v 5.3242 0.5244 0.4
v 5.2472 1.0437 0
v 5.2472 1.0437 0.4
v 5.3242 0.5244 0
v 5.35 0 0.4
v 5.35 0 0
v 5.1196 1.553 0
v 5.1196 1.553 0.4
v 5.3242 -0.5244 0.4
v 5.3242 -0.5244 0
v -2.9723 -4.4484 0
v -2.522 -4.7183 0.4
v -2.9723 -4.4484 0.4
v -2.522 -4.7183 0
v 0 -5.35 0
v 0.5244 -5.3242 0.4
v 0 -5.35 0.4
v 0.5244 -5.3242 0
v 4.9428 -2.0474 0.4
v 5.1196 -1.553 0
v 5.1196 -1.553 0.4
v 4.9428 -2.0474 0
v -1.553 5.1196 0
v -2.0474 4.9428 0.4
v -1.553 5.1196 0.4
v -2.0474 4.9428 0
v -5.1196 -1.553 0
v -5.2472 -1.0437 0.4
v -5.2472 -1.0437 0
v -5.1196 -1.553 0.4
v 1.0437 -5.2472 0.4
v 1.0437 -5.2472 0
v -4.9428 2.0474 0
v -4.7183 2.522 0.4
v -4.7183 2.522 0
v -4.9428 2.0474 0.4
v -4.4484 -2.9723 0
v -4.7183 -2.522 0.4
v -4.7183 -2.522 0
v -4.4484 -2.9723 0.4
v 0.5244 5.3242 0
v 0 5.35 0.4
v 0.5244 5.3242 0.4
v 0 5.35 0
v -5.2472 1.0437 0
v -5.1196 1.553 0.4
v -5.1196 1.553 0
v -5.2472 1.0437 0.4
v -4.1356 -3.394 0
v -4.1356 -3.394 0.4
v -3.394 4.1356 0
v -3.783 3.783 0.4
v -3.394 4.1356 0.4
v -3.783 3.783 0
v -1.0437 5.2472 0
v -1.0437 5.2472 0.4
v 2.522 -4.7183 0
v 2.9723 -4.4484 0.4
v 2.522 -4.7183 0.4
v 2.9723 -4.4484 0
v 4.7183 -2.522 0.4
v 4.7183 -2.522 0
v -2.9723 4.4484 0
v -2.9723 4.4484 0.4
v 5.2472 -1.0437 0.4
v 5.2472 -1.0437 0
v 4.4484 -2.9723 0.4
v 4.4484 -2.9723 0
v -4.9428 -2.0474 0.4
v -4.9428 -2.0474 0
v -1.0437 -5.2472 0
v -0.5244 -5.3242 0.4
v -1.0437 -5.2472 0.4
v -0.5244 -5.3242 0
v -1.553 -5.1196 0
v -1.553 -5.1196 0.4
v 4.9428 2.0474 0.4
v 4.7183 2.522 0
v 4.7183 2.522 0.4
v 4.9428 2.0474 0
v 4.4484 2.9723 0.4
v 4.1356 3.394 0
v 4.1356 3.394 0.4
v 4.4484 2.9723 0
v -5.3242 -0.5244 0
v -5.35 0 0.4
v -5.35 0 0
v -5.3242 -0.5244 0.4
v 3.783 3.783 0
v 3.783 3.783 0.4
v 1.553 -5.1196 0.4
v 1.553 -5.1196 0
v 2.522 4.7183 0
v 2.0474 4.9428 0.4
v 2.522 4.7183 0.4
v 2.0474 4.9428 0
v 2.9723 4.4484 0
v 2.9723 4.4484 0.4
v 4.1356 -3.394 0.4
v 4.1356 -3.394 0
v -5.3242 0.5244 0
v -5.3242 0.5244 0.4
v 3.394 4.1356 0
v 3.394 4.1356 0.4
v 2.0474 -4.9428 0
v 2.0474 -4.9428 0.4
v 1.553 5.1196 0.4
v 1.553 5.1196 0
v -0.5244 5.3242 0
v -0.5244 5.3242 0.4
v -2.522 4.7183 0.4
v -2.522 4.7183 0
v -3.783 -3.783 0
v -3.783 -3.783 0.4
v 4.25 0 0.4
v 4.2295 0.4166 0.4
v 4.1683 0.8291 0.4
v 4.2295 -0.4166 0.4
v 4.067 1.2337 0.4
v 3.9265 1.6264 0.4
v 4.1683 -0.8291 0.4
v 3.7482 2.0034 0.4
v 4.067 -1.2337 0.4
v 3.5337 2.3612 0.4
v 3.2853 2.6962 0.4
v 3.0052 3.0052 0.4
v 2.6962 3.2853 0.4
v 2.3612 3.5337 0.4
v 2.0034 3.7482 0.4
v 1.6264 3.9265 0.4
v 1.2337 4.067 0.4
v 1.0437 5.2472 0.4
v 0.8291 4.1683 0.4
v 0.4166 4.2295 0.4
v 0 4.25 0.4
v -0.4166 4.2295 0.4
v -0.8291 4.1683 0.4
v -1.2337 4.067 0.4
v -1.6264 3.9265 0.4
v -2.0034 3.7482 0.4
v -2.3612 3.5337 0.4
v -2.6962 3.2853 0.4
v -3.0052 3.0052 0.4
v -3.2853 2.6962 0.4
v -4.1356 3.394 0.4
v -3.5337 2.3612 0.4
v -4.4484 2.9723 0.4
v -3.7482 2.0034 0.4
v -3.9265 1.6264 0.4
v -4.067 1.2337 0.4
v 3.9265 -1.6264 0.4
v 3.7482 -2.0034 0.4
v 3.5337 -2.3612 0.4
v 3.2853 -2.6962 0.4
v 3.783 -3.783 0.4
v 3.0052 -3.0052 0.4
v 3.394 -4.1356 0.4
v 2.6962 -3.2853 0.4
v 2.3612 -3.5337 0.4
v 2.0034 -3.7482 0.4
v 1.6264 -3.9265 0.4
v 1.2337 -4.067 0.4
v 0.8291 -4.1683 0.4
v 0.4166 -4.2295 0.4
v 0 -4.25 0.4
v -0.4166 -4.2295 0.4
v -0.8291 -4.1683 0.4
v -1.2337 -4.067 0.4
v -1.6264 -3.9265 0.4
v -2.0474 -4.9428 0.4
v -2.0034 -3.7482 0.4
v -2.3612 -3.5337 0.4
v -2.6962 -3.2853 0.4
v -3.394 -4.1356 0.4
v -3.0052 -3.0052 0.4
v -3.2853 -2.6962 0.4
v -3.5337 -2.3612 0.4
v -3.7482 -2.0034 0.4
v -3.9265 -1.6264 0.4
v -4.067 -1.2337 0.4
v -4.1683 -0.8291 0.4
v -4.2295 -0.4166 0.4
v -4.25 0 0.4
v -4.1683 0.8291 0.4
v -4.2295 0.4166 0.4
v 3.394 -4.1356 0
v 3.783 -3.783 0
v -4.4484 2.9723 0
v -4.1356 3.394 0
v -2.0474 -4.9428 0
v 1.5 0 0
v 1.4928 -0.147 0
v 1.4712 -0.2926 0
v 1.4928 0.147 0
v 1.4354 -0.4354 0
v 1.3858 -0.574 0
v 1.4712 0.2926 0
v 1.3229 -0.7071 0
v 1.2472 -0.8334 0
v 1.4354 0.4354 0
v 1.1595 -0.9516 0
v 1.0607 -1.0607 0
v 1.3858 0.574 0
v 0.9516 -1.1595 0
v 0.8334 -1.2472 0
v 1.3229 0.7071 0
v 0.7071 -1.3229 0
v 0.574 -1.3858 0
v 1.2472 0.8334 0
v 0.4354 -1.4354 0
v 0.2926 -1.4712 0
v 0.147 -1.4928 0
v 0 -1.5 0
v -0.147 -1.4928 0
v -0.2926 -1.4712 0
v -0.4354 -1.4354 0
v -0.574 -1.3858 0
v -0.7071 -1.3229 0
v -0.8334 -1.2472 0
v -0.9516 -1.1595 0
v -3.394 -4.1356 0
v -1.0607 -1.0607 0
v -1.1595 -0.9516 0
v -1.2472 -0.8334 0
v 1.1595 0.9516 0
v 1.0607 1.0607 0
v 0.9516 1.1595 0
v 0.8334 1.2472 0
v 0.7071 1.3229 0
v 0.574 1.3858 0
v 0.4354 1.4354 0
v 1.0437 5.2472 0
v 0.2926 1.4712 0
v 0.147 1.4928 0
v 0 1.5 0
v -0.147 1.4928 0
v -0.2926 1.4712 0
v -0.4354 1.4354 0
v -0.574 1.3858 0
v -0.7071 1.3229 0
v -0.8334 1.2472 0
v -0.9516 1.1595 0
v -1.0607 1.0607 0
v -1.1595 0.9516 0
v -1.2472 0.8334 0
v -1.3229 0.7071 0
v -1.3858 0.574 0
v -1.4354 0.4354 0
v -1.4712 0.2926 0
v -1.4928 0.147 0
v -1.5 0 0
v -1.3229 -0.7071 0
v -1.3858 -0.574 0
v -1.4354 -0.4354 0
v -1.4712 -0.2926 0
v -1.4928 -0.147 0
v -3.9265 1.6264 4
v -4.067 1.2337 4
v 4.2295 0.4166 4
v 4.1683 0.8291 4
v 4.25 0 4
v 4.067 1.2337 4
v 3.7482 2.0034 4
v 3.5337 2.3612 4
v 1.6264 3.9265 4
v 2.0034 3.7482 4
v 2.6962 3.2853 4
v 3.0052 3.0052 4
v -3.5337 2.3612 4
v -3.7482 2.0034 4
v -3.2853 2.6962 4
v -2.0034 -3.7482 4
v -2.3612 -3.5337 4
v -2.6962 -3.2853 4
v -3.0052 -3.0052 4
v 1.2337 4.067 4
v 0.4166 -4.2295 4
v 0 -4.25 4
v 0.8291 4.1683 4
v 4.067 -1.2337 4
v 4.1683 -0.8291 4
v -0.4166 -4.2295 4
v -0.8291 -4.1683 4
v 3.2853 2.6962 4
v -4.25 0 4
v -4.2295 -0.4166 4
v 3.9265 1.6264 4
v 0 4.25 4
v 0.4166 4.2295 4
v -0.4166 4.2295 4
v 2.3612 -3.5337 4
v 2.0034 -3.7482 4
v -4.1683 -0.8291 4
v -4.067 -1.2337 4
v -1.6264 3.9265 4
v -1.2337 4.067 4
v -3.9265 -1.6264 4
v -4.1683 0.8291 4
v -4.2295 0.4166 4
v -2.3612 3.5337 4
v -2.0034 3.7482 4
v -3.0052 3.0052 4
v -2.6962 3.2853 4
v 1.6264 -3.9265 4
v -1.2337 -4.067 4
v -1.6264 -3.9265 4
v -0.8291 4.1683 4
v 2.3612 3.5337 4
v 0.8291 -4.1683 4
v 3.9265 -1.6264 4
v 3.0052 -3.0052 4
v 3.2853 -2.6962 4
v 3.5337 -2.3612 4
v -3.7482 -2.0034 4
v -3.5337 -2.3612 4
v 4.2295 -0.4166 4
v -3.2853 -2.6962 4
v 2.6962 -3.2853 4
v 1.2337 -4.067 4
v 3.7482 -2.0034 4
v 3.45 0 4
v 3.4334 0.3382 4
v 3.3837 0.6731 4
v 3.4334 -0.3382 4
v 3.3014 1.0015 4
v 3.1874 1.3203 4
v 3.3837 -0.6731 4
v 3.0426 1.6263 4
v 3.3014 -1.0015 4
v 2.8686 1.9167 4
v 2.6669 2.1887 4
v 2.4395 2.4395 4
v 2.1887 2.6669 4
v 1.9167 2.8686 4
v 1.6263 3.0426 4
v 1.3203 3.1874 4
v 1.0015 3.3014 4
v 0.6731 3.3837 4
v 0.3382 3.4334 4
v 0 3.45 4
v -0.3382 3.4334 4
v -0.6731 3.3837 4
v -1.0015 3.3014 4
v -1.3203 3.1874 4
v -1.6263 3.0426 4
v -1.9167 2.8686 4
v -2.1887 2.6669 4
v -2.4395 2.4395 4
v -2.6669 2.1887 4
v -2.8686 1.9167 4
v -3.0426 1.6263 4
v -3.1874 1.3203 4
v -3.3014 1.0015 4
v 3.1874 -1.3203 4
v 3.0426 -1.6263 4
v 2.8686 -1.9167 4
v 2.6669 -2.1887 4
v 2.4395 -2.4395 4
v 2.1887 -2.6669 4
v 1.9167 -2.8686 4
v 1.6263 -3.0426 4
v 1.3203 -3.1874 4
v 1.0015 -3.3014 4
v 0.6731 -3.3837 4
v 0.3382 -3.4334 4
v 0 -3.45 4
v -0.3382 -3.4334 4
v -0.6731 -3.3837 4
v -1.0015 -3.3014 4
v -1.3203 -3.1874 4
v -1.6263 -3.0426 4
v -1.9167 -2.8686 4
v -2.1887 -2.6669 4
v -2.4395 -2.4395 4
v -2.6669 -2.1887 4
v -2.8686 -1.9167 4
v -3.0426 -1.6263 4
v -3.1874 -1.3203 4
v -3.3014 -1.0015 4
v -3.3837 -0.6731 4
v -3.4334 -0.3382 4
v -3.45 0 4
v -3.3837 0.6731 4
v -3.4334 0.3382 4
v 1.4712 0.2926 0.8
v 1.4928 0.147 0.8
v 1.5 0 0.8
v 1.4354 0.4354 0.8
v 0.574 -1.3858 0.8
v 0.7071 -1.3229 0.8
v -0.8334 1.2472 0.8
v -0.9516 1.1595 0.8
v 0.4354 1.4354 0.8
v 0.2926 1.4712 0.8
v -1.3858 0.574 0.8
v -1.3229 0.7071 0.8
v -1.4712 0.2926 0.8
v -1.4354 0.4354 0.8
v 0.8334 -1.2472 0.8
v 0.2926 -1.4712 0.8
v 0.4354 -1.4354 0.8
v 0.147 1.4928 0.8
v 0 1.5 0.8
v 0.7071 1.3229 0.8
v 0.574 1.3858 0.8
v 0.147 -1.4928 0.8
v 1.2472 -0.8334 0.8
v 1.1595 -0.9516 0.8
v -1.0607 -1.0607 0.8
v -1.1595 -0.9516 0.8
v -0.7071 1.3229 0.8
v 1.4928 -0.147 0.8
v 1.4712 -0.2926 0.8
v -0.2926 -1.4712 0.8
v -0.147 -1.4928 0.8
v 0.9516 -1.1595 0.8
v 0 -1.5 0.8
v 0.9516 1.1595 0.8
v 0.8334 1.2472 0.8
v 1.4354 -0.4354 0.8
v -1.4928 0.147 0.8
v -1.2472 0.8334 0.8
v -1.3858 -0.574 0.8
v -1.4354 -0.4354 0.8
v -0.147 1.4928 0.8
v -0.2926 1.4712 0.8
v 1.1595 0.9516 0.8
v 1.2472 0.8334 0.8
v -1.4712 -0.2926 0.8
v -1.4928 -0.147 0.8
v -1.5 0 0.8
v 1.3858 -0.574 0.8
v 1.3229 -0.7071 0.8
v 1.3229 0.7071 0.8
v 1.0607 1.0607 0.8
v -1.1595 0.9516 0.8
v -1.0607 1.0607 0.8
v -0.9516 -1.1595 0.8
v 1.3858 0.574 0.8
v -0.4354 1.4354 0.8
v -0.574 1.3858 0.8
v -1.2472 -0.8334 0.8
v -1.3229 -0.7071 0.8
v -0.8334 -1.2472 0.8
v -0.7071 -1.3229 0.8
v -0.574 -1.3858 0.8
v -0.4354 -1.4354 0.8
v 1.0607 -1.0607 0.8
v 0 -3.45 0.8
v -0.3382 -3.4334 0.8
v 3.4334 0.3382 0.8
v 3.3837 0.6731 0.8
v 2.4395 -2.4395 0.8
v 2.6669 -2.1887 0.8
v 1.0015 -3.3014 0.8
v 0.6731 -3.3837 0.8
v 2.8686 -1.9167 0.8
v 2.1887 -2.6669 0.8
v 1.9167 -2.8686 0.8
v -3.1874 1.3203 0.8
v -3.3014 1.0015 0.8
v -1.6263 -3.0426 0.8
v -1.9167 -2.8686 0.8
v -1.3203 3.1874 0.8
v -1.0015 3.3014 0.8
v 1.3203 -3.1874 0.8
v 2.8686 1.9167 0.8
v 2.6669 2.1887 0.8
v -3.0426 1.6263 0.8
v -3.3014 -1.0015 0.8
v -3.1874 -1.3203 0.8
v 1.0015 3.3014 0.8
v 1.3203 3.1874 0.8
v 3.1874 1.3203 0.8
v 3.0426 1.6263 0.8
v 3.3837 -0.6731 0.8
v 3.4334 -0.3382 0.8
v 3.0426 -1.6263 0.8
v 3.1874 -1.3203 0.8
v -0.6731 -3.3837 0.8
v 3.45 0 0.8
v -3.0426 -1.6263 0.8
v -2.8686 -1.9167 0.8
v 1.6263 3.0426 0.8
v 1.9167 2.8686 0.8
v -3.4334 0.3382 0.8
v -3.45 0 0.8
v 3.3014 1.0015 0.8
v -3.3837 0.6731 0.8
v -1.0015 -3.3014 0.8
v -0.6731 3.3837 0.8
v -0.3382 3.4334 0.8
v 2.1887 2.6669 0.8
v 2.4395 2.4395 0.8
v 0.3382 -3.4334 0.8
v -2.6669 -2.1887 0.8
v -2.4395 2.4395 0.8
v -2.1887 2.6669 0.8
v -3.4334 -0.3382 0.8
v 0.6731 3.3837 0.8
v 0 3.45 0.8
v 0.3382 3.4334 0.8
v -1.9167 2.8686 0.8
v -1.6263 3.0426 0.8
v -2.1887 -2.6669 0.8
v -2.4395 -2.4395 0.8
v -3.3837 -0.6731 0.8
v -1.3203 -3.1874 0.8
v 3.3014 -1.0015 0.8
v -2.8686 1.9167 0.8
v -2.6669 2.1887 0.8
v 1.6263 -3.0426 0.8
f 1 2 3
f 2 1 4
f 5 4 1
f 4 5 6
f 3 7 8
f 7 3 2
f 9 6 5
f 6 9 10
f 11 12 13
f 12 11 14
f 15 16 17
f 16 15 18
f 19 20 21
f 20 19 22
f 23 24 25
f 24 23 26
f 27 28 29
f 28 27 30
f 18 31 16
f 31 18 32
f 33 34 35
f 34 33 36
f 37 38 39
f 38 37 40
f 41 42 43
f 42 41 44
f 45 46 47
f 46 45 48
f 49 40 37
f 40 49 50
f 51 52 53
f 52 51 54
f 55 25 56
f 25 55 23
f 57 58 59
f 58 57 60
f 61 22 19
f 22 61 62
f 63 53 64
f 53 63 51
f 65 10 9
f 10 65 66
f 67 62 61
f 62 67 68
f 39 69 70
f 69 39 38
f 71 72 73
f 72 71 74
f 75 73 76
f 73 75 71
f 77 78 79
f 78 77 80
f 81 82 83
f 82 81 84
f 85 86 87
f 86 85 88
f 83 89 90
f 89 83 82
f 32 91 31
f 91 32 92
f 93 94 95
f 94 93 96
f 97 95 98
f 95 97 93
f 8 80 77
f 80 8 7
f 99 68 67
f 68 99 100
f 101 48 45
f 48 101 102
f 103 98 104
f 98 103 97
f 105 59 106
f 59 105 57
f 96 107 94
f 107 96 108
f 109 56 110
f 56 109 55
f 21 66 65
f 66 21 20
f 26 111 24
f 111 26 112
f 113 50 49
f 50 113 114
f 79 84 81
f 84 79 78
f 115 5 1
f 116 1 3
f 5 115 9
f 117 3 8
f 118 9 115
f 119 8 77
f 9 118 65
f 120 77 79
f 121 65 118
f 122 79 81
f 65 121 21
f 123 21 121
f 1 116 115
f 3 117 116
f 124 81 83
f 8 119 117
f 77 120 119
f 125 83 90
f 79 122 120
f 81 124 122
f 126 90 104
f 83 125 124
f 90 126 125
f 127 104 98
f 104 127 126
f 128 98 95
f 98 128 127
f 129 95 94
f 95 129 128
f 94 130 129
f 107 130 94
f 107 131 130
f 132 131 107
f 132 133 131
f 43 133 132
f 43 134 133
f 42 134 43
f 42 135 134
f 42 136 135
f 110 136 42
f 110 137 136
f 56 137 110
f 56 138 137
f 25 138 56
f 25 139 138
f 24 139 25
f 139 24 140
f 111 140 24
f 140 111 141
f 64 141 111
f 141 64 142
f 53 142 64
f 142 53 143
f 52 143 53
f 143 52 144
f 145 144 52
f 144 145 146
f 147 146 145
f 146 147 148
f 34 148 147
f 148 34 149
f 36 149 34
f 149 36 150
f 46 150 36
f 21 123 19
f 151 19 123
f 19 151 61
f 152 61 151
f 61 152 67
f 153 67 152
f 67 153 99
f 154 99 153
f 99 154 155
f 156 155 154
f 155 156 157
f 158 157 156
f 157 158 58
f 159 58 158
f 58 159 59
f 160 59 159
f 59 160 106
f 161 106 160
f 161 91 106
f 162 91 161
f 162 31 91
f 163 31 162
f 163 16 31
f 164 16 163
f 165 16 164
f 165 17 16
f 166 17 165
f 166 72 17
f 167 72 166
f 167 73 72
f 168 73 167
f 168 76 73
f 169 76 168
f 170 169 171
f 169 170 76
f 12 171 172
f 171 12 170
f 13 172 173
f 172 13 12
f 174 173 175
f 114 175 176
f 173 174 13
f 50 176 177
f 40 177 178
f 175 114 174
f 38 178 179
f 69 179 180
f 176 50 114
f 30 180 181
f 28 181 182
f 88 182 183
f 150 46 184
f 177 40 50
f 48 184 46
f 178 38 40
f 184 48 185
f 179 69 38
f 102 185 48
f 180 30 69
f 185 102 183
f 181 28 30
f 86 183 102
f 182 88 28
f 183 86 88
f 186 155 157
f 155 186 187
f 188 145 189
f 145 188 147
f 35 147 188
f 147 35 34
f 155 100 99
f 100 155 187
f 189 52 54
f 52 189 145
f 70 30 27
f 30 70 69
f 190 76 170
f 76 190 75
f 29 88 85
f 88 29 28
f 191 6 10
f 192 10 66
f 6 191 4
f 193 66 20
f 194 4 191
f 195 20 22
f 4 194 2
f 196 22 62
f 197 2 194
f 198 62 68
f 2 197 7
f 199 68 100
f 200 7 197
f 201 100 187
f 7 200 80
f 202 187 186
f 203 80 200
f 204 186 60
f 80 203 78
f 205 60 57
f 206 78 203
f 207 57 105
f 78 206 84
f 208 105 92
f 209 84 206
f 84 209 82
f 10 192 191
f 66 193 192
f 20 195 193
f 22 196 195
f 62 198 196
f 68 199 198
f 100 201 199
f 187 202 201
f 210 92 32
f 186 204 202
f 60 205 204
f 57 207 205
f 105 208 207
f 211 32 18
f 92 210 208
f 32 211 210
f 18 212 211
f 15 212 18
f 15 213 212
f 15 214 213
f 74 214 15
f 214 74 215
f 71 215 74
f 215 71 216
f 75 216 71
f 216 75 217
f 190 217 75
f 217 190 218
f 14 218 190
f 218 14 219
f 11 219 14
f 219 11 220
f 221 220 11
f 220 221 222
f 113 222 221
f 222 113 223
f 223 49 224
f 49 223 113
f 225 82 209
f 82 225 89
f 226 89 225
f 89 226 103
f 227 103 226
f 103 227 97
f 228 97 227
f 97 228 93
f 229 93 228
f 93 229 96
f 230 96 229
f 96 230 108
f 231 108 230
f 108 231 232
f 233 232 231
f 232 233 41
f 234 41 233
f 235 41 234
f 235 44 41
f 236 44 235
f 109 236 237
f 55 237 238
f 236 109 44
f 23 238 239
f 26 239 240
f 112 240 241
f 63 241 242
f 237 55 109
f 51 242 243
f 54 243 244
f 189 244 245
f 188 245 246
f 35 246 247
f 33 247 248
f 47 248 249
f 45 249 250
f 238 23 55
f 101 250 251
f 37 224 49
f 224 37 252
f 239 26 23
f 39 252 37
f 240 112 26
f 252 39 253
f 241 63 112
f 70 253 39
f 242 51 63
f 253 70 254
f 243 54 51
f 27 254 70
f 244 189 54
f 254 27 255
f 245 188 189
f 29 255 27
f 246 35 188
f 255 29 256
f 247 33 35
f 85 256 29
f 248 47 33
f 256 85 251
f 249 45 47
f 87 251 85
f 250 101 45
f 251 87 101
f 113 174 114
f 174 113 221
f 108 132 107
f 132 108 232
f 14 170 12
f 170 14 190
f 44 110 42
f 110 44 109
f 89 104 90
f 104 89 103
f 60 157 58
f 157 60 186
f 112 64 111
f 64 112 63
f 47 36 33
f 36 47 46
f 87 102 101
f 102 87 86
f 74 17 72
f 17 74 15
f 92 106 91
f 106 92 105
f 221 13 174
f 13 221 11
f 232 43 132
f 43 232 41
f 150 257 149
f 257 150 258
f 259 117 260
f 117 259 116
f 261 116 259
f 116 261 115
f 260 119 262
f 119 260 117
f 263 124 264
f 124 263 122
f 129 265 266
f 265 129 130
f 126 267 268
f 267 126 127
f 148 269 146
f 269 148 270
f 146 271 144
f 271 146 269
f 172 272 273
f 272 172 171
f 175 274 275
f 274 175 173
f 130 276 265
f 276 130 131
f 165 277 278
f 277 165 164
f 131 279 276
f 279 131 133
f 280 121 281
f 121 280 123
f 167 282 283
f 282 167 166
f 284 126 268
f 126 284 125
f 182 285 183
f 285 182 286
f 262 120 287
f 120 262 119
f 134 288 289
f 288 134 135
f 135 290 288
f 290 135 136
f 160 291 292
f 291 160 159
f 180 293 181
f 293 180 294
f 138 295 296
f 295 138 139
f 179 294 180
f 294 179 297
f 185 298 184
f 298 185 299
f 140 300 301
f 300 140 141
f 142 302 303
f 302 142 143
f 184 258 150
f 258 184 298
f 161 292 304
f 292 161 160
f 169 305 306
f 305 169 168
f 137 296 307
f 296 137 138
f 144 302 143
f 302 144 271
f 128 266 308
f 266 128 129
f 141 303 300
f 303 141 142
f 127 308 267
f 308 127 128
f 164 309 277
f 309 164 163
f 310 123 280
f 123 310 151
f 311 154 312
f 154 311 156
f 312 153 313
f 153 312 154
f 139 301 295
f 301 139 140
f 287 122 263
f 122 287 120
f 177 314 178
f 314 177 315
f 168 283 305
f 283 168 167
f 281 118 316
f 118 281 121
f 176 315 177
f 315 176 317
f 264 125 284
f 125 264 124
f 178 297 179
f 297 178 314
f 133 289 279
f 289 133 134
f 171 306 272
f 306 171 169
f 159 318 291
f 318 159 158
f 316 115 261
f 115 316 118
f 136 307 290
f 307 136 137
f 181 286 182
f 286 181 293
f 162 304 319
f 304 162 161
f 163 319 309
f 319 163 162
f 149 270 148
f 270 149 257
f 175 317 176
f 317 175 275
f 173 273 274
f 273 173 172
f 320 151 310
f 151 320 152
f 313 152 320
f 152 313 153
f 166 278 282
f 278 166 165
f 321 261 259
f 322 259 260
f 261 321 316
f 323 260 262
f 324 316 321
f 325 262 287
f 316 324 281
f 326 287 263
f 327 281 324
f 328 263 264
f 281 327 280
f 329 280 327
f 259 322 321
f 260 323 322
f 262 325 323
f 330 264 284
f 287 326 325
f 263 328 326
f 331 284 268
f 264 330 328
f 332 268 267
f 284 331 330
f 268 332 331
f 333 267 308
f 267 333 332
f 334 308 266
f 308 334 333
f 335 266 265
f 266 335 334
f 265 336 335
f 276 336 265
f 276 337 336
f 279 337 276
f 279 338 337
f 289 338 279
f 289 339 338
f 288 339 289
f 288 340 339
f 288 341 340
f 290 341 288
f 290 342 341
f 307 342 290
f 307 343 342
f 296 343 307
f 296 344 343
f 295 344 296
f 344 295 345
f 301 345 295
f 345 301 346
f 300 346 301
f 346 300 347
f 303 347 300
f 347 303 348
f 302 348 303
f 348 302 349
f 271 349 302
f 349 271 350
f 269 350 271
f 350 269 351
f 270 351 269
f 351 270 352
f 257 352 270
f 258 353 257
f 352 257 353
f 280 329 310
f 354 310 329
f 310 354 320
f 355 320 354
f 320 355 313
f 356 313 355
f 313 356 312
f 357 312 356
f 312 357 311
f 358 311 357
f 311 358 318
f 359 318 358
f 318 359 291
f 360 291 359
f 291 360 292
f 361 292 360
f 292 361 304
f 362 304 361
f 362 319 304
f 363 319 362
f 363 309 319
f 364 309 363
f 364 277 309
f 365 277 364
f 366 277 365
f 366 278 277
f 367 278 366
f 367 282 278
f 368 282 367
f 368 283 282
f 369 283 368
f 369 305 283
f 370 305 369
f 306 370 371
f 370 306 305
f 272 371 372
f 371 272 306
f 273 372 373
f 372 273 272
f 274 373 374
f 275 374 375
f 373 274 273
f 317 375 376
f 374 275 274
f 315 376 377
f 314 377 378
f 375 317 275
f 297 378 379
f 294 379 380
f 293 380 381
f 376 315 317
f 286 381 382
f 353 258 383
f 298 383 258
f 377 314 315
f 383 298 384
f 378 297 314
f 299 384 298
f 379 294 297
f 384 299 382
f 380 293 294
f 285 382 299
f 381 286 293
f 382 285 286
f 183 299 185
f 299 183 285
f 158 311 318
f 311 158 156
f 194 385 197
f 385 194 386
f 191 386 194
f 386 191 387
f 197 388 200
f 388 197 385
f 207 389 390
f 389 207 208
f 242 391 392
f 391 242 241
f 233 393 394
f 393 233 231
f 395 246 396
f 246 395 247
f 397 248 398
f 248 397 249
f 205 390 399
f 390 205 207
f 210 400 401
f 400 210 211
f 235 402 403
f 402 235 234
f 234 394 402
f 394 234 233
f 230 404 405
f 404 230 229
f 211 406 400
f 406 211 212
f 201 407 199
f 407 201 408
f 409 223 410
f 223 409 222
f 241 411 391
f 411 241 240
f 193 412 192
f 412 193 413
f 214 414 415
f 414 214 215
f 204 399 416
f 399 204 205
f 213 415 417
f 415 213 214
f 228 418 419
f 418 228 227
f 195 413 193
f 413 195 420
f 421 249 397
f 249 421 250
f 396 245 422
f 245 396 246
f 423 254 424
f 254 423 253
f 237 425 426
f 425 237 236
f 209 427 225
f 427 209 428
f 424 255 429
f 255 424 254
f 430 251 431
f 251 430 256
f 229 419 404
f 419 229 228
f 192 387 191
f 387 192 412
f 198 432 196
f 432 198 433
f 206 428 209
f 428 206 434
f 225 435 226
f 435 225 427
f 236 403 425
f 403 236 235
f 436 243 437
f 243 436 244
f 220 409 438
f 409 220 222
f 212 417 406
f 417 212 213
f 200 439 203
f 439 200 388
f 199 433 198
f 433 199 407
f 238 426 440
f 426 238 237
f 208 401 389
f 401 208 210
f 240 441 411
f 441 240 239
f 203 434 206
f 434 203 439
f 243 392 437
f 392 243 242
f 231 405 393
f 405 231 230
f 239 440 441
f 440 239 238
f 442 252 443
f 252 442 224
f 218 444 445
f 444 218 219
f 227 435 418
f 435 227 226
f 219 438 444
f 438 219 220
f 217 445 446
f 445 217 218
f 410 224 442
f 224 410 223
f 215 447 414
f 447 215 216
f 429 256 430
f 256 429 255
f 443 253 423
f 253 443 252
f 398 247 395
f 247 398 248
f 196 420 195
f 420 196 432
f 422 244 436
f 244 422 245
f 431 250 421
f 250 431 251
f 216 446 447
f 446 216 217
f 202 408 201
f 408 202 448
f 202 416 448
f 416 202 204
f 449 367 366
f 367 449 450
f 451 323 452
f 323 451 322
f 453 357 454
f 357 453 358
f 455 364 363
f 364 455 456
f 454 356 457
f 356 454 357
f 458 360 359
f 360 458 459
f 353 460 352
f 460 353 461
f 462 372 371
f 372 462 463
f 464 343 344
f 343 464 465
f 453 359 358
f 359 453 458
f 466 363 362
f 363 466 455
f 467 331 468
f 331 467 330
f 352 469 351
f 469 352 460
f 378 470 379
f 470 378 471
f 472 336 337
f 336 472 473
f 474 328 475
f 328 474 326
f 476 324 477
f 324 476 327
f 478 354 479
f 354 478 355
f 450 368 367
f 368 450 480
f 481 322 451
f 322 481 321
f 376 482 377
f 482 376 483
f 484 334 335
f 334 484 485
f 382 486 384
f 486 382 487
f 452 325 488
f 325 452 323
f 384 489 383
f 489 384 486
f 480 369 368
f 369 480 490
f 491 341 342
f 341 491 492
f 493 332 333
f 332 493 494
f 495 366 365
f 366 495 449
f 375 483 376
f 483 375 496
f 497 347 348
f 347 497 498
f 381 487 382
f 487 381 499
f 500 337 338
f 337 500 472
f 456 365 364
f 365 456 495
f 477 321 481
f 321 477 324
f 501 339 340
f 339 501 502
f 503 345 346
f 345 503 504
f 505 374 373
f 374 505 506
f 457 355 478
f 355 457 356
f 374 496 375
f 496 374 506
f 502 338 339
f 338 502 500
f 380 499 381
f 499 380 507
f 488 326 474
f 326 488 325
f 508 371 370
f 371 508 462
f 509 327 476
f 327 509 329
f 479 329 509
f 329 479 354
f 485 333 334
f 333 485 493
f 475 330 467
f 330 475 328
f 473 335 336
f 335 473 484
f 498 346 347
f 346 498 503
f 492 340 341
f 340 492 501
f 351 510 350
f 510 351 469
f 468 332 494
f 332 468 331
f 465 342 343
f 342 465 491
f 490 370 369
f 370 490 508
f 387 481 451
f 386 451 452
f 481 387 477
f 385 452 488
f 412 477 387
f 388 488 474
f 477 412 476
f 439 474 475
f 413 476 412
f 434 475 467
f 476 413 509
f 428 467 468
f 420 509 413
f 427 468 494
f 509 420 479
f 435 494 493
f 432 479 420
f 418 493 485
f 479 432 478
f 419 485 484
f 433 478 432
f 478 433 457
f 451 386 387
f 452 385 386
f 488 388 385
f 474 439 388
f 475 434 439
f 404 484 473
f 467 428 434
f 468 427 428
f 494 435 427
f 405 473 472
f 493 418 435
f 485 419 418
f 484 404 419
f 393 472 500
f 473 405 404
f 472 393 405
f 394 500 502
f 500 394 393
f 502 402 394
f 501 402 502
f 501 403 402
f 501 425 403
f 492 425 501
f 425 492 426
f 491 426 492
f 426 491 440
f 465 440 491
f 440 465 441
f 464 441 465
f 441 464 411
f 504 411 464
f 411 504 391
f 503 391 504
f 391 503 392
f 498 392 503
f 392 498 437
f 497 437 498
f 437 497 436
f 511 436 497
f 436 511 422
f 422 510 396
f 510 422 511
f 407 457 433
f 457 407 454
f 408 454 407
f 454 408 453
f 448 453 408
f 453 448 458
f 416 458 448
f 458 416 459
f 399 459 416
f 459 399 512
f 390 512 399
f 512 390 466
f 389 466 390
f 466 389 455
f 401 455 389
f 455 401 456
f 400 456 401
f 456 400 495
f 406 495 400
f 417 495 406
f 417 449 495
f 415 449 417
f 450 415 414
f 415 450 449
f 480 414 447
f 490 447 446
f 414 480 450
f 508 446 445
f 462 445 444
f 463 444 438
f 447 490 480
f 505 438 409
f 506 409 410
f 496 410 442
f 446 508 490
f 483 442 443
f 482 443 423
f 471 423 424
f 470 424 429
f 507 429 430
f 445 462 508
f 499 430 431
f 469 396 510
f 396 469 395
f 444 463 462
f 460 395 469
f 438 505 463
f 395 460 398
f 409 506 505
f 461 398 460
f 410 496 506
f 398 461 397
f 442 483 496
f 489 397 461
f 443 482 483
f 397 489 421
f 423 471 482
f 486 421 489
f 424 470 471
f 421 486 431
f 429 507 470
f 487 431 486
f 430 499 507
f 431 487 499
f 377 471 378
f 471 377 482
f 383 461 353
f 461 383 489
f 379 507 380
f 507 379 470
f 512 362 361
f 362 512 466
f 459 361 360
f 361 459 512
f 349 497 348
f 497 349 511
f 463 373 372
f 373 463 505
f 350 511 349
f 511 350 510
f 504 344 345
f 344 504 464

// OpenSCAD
$fn=64;

//outer diameter of tube hole
D_1=10.7;

//inner diameter of tube hole
D_OUT=8.5;

//economic hole
D_in=3;

//height 1
H_1=0.4;

//height 2
H_2=4;


module econom(dout=8.5,din=3,h1=0.4,h2=4,dout2=10.7){
    difference(){
        union(){
            cylinder(d=dout2,h=h1);
            cylinder(d=dout,h=h2);
        }
        cylinder(d=din,h=h2+1);
        translate([0,0,h1*2])cylinder(d=dout-0.4*4,h=h2+1);
    }

}

//colgate
//econom(dout=8.5,din=3,h1=0.4,h2=4,dout2=10.7);

//lyolan
//translate([11,0,0])econom(dout=6.6,din=2,h1=0.4,h2=4,dout2=9.7);

econom(dout=D_OUT,din=D_in,h1=H_1,h2=H_2,dout2=D_1);
